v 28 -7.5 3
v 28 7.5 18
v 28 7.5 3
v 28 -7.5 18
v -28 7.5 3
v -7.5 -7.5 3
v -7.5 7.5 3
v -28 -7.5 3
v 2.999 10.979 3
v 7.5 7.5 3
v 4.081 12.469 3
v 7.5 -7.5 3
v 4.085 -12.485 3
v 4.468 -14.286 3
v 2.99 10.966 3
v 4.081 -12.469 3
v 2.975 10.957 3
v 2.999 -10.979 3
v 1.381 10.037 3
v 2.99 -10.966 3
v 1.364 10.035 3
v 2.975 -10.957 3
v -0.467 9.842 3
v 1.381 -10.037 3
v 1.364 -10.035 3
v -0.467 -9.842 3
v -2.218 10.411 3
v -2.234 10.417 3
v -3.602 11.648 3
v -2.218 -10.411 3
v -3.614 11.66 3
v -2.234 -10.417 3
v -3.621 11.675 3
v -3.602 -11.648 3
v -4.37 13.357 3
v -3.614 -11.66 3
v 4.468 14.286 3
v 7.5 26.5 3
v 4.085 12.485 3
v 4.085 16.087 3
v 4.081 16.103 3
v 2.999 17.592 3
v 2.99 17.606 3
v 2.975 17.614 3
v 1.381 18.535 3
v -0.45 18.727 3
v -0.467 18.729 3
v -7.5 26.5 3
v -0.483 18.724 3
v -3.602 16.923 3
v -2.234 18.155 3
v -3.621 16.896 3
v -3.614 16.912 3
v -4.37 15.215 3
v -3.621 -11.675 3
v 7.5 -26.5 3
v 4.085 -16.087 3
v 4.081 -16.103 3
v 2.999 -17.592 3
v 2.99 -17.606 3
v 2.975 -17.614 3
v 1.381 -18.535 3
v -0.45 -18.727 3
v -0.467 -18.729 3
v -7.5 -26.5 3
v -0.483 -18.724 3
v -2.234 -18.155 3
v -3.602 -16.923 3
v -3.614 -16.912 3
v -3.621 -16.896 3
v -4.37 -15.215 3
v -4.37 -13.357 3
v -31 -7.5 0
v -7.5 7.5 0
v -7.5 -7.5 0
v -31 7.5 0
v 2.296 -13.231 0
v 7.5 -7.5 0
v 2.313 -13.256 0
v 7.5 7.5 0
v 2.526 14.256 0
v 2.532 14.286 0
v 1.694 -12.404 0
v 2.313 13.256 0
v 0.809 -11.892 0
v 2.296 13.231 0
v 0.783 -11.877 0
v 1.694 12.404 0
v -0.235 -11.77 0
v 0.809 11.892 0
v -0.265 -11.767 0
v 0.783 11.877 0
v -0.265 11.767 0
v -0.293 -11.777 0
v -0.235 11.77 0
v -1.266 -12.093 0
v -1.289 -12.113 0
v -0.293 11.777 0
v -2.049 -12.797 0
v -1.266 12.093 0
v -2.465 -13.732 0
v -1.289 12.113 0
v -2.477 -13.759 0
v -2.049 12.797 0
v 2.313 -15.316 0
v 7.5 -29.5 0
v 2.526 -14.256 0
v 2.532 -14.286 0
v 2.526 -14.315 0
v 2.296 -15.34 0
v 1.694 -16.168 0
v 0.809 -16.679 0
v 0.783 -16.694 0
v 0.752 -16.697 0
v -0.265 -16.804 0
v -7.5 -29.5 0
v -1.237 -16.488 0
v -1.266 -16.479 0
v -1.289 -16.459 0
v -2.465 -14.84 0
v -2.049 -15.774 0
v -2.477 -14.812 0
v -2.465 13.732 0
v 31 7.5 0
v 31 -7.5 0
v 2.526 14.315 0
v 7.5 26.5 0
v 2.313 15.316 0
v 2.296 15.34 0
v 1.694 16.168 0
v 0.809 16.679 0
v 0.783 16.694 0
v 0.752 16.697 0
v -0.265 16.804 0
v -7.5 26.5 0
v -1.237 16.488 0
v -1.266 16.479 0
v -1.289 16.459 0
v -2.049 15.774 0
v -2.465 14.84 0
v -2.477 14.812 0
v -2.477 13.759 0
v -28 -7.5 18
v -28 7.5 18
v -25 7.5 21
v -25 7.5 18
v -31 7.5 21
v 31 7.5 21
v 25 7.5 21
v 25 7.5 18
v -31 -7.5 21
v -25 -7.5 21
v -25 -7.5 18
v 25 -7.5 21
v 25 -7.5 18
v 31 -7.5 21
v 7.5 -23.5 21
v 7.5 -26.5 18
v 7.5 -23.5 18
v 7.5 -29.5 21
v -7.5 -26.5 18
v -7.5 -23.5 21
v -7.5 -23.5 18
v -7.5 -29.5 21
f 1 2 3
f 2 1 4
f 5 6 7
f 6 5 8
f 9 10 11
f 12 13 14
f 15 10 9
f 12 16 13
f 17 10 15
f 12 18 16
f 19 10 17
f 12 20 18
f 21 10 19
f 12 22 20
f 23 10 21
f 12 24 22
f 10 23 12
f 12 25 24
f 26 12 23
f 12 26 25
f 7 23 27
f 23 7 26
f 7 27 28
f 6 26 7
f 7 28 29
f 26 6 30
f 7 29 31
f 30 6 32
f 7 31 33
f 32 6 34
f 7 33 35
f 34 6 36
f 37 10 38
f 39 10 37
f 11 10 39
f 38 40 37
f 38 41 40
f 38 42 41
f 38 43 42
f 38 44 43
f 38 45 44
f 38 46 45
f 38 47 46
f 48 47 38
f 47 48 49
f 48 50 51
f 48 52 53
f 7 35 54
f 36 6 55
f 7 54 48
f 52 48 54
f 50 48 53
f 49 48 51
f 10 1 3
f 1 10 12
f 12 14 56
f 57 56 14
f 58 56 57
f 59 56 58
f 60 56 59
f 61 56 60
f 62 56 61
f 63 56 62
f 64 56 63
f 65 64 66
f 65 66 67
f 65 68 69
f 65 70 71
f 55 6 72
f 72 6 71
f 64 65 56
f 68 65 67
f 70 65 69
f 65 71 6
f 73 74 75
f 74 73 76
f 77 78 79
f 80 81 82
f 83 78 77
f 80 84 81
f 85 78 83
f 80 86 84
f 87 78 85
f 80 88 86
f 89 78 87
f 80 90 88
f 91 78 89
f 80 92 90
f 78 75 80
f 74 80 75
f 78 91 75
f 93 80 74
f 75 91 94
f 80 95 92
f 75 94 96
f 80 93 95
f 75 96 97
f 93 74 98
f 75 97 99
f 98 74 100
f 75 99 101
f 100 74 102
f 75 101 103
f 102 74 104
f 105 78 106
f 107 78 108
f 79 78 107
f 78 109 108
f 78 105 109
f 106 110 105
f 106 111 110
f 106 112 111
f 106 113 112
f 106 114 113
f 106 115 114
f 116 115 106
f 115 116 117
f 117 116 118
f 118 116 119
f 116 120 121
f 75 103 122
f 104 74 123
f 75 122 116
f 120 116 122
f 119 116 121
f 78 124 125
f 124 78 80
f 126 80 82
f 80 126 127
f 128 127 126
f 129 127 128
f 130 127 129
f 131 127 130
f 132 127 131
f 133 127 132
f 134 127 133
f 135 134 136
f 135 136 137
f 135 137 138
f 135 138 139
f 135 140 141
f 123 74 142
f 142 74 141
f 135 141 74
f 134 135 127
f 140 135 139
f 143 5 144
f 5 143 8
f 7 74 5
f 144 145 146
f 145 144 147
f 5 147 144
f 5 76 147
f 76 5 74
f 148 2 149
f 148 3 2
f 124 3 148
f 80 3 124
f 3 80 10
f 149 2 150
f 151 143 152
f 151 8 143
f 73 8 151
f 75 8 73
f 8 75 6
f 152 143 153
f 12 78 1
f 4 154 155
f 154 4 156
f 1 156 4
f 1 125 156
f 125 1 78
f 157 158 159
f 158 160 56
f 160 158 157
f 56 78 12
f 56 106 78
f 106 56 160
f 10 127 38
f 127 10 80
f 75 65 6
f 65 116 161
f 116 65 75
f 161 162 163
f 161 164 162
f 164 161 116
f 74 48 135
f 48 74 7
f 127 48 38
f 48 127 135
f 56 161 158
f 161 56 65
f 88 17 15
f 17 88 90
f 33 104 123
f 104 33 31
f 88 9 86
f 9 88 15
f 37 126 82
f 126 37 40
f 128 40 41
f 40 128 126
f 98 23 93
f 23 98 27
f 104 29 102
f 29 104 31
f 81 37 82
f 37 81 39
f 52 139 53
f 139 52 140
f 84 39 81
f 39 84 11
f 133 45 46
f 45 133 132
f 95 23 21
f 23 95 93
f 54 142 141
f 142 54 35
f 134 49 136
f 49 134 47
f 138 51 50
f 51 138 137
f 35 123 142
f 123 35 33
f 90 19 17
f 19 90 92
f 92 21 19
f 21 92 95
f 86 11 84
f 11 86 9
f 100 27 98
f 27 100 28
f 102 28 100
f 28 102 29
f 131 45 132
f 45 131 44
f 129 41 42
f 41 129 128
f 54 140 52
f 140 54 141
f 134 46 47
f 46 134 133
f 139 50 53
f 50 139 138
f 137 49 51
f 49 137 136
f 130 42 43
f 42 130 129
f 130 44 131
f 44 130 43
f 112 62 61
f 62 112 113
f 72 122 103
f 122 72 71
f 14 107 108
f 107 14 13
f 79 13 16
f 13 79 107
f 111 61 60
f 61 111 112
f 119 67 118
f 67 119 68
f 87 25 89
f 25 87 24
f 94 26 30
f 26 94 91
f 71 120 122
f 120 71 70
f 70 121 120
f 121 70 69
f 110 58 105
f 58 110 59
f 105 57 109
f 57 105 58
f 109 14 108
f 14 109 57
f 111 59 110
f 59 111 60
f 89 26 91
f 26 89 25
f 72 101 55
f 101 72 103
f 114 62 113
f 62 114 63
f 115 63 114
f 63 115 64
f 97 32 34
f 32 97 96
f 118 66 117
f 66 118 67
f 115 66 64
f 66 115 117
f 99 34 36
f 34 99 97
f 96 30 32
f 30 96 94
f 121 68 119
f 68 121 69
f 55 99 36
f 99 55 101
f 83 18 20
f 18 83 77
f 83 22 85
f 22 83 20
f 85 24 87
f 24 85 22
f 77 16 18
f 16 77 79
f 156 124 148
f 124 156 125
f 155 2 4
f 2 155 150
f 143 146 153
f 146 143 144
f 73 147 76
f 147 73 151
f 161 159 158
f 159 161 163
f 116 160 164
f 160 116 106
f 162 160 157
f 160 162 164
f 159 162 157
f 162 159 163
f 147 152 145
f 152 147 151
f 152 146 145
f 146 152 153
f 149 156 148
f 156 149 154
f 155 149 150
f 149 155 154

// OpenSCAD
//itemwidth
itemwidth = 50;
//itemheight
itemheight = 50;
//itemdepth
itemdepth = 15;

difference() {
    union() {
    translate([0,0,1.5])
        cube([(itemwidth+6),15,3], center=true);
    translate([0,0,1.5]) 
        cube([15,(itemheight+3),3], center=true); 
}
translate([0,(itemheight/3.5),1.5]) 
cylinder(h=3.1,r1=2.5,r2=4.5,center=true);
translate([0,-(itemheight/3.5),1.5]) 
cylinder(h=3.1,r1=2.5,r2=4.5,center=true);
}

translate([((itemwidth/2)+3),-7.5,0])
    cube([3,15,(itemdepth+3)]);
    
translate([-((itemwidth/2)+6),-7.5,0])
    cube([3,15,(itemdepth+3)]);
    
translate([-7.5,-((itemheight/2)+4.5),0])
    cube([15,3,(itemdepth+3)]);
    
translate([-7.5,-((itemheight/2)+4.5),(itemdepth+3)])
    cube([15,6,3]);
    
translate([-(itemwidth/2),-7.5,(itemdepth+3)])
rotate(90)
    cube([15,6,3]);
    
translate([(itemwidth/2)+6,-7.5,(itemdepth+3)])
rotate(90)
    cube([15,6,3]);
    
    
